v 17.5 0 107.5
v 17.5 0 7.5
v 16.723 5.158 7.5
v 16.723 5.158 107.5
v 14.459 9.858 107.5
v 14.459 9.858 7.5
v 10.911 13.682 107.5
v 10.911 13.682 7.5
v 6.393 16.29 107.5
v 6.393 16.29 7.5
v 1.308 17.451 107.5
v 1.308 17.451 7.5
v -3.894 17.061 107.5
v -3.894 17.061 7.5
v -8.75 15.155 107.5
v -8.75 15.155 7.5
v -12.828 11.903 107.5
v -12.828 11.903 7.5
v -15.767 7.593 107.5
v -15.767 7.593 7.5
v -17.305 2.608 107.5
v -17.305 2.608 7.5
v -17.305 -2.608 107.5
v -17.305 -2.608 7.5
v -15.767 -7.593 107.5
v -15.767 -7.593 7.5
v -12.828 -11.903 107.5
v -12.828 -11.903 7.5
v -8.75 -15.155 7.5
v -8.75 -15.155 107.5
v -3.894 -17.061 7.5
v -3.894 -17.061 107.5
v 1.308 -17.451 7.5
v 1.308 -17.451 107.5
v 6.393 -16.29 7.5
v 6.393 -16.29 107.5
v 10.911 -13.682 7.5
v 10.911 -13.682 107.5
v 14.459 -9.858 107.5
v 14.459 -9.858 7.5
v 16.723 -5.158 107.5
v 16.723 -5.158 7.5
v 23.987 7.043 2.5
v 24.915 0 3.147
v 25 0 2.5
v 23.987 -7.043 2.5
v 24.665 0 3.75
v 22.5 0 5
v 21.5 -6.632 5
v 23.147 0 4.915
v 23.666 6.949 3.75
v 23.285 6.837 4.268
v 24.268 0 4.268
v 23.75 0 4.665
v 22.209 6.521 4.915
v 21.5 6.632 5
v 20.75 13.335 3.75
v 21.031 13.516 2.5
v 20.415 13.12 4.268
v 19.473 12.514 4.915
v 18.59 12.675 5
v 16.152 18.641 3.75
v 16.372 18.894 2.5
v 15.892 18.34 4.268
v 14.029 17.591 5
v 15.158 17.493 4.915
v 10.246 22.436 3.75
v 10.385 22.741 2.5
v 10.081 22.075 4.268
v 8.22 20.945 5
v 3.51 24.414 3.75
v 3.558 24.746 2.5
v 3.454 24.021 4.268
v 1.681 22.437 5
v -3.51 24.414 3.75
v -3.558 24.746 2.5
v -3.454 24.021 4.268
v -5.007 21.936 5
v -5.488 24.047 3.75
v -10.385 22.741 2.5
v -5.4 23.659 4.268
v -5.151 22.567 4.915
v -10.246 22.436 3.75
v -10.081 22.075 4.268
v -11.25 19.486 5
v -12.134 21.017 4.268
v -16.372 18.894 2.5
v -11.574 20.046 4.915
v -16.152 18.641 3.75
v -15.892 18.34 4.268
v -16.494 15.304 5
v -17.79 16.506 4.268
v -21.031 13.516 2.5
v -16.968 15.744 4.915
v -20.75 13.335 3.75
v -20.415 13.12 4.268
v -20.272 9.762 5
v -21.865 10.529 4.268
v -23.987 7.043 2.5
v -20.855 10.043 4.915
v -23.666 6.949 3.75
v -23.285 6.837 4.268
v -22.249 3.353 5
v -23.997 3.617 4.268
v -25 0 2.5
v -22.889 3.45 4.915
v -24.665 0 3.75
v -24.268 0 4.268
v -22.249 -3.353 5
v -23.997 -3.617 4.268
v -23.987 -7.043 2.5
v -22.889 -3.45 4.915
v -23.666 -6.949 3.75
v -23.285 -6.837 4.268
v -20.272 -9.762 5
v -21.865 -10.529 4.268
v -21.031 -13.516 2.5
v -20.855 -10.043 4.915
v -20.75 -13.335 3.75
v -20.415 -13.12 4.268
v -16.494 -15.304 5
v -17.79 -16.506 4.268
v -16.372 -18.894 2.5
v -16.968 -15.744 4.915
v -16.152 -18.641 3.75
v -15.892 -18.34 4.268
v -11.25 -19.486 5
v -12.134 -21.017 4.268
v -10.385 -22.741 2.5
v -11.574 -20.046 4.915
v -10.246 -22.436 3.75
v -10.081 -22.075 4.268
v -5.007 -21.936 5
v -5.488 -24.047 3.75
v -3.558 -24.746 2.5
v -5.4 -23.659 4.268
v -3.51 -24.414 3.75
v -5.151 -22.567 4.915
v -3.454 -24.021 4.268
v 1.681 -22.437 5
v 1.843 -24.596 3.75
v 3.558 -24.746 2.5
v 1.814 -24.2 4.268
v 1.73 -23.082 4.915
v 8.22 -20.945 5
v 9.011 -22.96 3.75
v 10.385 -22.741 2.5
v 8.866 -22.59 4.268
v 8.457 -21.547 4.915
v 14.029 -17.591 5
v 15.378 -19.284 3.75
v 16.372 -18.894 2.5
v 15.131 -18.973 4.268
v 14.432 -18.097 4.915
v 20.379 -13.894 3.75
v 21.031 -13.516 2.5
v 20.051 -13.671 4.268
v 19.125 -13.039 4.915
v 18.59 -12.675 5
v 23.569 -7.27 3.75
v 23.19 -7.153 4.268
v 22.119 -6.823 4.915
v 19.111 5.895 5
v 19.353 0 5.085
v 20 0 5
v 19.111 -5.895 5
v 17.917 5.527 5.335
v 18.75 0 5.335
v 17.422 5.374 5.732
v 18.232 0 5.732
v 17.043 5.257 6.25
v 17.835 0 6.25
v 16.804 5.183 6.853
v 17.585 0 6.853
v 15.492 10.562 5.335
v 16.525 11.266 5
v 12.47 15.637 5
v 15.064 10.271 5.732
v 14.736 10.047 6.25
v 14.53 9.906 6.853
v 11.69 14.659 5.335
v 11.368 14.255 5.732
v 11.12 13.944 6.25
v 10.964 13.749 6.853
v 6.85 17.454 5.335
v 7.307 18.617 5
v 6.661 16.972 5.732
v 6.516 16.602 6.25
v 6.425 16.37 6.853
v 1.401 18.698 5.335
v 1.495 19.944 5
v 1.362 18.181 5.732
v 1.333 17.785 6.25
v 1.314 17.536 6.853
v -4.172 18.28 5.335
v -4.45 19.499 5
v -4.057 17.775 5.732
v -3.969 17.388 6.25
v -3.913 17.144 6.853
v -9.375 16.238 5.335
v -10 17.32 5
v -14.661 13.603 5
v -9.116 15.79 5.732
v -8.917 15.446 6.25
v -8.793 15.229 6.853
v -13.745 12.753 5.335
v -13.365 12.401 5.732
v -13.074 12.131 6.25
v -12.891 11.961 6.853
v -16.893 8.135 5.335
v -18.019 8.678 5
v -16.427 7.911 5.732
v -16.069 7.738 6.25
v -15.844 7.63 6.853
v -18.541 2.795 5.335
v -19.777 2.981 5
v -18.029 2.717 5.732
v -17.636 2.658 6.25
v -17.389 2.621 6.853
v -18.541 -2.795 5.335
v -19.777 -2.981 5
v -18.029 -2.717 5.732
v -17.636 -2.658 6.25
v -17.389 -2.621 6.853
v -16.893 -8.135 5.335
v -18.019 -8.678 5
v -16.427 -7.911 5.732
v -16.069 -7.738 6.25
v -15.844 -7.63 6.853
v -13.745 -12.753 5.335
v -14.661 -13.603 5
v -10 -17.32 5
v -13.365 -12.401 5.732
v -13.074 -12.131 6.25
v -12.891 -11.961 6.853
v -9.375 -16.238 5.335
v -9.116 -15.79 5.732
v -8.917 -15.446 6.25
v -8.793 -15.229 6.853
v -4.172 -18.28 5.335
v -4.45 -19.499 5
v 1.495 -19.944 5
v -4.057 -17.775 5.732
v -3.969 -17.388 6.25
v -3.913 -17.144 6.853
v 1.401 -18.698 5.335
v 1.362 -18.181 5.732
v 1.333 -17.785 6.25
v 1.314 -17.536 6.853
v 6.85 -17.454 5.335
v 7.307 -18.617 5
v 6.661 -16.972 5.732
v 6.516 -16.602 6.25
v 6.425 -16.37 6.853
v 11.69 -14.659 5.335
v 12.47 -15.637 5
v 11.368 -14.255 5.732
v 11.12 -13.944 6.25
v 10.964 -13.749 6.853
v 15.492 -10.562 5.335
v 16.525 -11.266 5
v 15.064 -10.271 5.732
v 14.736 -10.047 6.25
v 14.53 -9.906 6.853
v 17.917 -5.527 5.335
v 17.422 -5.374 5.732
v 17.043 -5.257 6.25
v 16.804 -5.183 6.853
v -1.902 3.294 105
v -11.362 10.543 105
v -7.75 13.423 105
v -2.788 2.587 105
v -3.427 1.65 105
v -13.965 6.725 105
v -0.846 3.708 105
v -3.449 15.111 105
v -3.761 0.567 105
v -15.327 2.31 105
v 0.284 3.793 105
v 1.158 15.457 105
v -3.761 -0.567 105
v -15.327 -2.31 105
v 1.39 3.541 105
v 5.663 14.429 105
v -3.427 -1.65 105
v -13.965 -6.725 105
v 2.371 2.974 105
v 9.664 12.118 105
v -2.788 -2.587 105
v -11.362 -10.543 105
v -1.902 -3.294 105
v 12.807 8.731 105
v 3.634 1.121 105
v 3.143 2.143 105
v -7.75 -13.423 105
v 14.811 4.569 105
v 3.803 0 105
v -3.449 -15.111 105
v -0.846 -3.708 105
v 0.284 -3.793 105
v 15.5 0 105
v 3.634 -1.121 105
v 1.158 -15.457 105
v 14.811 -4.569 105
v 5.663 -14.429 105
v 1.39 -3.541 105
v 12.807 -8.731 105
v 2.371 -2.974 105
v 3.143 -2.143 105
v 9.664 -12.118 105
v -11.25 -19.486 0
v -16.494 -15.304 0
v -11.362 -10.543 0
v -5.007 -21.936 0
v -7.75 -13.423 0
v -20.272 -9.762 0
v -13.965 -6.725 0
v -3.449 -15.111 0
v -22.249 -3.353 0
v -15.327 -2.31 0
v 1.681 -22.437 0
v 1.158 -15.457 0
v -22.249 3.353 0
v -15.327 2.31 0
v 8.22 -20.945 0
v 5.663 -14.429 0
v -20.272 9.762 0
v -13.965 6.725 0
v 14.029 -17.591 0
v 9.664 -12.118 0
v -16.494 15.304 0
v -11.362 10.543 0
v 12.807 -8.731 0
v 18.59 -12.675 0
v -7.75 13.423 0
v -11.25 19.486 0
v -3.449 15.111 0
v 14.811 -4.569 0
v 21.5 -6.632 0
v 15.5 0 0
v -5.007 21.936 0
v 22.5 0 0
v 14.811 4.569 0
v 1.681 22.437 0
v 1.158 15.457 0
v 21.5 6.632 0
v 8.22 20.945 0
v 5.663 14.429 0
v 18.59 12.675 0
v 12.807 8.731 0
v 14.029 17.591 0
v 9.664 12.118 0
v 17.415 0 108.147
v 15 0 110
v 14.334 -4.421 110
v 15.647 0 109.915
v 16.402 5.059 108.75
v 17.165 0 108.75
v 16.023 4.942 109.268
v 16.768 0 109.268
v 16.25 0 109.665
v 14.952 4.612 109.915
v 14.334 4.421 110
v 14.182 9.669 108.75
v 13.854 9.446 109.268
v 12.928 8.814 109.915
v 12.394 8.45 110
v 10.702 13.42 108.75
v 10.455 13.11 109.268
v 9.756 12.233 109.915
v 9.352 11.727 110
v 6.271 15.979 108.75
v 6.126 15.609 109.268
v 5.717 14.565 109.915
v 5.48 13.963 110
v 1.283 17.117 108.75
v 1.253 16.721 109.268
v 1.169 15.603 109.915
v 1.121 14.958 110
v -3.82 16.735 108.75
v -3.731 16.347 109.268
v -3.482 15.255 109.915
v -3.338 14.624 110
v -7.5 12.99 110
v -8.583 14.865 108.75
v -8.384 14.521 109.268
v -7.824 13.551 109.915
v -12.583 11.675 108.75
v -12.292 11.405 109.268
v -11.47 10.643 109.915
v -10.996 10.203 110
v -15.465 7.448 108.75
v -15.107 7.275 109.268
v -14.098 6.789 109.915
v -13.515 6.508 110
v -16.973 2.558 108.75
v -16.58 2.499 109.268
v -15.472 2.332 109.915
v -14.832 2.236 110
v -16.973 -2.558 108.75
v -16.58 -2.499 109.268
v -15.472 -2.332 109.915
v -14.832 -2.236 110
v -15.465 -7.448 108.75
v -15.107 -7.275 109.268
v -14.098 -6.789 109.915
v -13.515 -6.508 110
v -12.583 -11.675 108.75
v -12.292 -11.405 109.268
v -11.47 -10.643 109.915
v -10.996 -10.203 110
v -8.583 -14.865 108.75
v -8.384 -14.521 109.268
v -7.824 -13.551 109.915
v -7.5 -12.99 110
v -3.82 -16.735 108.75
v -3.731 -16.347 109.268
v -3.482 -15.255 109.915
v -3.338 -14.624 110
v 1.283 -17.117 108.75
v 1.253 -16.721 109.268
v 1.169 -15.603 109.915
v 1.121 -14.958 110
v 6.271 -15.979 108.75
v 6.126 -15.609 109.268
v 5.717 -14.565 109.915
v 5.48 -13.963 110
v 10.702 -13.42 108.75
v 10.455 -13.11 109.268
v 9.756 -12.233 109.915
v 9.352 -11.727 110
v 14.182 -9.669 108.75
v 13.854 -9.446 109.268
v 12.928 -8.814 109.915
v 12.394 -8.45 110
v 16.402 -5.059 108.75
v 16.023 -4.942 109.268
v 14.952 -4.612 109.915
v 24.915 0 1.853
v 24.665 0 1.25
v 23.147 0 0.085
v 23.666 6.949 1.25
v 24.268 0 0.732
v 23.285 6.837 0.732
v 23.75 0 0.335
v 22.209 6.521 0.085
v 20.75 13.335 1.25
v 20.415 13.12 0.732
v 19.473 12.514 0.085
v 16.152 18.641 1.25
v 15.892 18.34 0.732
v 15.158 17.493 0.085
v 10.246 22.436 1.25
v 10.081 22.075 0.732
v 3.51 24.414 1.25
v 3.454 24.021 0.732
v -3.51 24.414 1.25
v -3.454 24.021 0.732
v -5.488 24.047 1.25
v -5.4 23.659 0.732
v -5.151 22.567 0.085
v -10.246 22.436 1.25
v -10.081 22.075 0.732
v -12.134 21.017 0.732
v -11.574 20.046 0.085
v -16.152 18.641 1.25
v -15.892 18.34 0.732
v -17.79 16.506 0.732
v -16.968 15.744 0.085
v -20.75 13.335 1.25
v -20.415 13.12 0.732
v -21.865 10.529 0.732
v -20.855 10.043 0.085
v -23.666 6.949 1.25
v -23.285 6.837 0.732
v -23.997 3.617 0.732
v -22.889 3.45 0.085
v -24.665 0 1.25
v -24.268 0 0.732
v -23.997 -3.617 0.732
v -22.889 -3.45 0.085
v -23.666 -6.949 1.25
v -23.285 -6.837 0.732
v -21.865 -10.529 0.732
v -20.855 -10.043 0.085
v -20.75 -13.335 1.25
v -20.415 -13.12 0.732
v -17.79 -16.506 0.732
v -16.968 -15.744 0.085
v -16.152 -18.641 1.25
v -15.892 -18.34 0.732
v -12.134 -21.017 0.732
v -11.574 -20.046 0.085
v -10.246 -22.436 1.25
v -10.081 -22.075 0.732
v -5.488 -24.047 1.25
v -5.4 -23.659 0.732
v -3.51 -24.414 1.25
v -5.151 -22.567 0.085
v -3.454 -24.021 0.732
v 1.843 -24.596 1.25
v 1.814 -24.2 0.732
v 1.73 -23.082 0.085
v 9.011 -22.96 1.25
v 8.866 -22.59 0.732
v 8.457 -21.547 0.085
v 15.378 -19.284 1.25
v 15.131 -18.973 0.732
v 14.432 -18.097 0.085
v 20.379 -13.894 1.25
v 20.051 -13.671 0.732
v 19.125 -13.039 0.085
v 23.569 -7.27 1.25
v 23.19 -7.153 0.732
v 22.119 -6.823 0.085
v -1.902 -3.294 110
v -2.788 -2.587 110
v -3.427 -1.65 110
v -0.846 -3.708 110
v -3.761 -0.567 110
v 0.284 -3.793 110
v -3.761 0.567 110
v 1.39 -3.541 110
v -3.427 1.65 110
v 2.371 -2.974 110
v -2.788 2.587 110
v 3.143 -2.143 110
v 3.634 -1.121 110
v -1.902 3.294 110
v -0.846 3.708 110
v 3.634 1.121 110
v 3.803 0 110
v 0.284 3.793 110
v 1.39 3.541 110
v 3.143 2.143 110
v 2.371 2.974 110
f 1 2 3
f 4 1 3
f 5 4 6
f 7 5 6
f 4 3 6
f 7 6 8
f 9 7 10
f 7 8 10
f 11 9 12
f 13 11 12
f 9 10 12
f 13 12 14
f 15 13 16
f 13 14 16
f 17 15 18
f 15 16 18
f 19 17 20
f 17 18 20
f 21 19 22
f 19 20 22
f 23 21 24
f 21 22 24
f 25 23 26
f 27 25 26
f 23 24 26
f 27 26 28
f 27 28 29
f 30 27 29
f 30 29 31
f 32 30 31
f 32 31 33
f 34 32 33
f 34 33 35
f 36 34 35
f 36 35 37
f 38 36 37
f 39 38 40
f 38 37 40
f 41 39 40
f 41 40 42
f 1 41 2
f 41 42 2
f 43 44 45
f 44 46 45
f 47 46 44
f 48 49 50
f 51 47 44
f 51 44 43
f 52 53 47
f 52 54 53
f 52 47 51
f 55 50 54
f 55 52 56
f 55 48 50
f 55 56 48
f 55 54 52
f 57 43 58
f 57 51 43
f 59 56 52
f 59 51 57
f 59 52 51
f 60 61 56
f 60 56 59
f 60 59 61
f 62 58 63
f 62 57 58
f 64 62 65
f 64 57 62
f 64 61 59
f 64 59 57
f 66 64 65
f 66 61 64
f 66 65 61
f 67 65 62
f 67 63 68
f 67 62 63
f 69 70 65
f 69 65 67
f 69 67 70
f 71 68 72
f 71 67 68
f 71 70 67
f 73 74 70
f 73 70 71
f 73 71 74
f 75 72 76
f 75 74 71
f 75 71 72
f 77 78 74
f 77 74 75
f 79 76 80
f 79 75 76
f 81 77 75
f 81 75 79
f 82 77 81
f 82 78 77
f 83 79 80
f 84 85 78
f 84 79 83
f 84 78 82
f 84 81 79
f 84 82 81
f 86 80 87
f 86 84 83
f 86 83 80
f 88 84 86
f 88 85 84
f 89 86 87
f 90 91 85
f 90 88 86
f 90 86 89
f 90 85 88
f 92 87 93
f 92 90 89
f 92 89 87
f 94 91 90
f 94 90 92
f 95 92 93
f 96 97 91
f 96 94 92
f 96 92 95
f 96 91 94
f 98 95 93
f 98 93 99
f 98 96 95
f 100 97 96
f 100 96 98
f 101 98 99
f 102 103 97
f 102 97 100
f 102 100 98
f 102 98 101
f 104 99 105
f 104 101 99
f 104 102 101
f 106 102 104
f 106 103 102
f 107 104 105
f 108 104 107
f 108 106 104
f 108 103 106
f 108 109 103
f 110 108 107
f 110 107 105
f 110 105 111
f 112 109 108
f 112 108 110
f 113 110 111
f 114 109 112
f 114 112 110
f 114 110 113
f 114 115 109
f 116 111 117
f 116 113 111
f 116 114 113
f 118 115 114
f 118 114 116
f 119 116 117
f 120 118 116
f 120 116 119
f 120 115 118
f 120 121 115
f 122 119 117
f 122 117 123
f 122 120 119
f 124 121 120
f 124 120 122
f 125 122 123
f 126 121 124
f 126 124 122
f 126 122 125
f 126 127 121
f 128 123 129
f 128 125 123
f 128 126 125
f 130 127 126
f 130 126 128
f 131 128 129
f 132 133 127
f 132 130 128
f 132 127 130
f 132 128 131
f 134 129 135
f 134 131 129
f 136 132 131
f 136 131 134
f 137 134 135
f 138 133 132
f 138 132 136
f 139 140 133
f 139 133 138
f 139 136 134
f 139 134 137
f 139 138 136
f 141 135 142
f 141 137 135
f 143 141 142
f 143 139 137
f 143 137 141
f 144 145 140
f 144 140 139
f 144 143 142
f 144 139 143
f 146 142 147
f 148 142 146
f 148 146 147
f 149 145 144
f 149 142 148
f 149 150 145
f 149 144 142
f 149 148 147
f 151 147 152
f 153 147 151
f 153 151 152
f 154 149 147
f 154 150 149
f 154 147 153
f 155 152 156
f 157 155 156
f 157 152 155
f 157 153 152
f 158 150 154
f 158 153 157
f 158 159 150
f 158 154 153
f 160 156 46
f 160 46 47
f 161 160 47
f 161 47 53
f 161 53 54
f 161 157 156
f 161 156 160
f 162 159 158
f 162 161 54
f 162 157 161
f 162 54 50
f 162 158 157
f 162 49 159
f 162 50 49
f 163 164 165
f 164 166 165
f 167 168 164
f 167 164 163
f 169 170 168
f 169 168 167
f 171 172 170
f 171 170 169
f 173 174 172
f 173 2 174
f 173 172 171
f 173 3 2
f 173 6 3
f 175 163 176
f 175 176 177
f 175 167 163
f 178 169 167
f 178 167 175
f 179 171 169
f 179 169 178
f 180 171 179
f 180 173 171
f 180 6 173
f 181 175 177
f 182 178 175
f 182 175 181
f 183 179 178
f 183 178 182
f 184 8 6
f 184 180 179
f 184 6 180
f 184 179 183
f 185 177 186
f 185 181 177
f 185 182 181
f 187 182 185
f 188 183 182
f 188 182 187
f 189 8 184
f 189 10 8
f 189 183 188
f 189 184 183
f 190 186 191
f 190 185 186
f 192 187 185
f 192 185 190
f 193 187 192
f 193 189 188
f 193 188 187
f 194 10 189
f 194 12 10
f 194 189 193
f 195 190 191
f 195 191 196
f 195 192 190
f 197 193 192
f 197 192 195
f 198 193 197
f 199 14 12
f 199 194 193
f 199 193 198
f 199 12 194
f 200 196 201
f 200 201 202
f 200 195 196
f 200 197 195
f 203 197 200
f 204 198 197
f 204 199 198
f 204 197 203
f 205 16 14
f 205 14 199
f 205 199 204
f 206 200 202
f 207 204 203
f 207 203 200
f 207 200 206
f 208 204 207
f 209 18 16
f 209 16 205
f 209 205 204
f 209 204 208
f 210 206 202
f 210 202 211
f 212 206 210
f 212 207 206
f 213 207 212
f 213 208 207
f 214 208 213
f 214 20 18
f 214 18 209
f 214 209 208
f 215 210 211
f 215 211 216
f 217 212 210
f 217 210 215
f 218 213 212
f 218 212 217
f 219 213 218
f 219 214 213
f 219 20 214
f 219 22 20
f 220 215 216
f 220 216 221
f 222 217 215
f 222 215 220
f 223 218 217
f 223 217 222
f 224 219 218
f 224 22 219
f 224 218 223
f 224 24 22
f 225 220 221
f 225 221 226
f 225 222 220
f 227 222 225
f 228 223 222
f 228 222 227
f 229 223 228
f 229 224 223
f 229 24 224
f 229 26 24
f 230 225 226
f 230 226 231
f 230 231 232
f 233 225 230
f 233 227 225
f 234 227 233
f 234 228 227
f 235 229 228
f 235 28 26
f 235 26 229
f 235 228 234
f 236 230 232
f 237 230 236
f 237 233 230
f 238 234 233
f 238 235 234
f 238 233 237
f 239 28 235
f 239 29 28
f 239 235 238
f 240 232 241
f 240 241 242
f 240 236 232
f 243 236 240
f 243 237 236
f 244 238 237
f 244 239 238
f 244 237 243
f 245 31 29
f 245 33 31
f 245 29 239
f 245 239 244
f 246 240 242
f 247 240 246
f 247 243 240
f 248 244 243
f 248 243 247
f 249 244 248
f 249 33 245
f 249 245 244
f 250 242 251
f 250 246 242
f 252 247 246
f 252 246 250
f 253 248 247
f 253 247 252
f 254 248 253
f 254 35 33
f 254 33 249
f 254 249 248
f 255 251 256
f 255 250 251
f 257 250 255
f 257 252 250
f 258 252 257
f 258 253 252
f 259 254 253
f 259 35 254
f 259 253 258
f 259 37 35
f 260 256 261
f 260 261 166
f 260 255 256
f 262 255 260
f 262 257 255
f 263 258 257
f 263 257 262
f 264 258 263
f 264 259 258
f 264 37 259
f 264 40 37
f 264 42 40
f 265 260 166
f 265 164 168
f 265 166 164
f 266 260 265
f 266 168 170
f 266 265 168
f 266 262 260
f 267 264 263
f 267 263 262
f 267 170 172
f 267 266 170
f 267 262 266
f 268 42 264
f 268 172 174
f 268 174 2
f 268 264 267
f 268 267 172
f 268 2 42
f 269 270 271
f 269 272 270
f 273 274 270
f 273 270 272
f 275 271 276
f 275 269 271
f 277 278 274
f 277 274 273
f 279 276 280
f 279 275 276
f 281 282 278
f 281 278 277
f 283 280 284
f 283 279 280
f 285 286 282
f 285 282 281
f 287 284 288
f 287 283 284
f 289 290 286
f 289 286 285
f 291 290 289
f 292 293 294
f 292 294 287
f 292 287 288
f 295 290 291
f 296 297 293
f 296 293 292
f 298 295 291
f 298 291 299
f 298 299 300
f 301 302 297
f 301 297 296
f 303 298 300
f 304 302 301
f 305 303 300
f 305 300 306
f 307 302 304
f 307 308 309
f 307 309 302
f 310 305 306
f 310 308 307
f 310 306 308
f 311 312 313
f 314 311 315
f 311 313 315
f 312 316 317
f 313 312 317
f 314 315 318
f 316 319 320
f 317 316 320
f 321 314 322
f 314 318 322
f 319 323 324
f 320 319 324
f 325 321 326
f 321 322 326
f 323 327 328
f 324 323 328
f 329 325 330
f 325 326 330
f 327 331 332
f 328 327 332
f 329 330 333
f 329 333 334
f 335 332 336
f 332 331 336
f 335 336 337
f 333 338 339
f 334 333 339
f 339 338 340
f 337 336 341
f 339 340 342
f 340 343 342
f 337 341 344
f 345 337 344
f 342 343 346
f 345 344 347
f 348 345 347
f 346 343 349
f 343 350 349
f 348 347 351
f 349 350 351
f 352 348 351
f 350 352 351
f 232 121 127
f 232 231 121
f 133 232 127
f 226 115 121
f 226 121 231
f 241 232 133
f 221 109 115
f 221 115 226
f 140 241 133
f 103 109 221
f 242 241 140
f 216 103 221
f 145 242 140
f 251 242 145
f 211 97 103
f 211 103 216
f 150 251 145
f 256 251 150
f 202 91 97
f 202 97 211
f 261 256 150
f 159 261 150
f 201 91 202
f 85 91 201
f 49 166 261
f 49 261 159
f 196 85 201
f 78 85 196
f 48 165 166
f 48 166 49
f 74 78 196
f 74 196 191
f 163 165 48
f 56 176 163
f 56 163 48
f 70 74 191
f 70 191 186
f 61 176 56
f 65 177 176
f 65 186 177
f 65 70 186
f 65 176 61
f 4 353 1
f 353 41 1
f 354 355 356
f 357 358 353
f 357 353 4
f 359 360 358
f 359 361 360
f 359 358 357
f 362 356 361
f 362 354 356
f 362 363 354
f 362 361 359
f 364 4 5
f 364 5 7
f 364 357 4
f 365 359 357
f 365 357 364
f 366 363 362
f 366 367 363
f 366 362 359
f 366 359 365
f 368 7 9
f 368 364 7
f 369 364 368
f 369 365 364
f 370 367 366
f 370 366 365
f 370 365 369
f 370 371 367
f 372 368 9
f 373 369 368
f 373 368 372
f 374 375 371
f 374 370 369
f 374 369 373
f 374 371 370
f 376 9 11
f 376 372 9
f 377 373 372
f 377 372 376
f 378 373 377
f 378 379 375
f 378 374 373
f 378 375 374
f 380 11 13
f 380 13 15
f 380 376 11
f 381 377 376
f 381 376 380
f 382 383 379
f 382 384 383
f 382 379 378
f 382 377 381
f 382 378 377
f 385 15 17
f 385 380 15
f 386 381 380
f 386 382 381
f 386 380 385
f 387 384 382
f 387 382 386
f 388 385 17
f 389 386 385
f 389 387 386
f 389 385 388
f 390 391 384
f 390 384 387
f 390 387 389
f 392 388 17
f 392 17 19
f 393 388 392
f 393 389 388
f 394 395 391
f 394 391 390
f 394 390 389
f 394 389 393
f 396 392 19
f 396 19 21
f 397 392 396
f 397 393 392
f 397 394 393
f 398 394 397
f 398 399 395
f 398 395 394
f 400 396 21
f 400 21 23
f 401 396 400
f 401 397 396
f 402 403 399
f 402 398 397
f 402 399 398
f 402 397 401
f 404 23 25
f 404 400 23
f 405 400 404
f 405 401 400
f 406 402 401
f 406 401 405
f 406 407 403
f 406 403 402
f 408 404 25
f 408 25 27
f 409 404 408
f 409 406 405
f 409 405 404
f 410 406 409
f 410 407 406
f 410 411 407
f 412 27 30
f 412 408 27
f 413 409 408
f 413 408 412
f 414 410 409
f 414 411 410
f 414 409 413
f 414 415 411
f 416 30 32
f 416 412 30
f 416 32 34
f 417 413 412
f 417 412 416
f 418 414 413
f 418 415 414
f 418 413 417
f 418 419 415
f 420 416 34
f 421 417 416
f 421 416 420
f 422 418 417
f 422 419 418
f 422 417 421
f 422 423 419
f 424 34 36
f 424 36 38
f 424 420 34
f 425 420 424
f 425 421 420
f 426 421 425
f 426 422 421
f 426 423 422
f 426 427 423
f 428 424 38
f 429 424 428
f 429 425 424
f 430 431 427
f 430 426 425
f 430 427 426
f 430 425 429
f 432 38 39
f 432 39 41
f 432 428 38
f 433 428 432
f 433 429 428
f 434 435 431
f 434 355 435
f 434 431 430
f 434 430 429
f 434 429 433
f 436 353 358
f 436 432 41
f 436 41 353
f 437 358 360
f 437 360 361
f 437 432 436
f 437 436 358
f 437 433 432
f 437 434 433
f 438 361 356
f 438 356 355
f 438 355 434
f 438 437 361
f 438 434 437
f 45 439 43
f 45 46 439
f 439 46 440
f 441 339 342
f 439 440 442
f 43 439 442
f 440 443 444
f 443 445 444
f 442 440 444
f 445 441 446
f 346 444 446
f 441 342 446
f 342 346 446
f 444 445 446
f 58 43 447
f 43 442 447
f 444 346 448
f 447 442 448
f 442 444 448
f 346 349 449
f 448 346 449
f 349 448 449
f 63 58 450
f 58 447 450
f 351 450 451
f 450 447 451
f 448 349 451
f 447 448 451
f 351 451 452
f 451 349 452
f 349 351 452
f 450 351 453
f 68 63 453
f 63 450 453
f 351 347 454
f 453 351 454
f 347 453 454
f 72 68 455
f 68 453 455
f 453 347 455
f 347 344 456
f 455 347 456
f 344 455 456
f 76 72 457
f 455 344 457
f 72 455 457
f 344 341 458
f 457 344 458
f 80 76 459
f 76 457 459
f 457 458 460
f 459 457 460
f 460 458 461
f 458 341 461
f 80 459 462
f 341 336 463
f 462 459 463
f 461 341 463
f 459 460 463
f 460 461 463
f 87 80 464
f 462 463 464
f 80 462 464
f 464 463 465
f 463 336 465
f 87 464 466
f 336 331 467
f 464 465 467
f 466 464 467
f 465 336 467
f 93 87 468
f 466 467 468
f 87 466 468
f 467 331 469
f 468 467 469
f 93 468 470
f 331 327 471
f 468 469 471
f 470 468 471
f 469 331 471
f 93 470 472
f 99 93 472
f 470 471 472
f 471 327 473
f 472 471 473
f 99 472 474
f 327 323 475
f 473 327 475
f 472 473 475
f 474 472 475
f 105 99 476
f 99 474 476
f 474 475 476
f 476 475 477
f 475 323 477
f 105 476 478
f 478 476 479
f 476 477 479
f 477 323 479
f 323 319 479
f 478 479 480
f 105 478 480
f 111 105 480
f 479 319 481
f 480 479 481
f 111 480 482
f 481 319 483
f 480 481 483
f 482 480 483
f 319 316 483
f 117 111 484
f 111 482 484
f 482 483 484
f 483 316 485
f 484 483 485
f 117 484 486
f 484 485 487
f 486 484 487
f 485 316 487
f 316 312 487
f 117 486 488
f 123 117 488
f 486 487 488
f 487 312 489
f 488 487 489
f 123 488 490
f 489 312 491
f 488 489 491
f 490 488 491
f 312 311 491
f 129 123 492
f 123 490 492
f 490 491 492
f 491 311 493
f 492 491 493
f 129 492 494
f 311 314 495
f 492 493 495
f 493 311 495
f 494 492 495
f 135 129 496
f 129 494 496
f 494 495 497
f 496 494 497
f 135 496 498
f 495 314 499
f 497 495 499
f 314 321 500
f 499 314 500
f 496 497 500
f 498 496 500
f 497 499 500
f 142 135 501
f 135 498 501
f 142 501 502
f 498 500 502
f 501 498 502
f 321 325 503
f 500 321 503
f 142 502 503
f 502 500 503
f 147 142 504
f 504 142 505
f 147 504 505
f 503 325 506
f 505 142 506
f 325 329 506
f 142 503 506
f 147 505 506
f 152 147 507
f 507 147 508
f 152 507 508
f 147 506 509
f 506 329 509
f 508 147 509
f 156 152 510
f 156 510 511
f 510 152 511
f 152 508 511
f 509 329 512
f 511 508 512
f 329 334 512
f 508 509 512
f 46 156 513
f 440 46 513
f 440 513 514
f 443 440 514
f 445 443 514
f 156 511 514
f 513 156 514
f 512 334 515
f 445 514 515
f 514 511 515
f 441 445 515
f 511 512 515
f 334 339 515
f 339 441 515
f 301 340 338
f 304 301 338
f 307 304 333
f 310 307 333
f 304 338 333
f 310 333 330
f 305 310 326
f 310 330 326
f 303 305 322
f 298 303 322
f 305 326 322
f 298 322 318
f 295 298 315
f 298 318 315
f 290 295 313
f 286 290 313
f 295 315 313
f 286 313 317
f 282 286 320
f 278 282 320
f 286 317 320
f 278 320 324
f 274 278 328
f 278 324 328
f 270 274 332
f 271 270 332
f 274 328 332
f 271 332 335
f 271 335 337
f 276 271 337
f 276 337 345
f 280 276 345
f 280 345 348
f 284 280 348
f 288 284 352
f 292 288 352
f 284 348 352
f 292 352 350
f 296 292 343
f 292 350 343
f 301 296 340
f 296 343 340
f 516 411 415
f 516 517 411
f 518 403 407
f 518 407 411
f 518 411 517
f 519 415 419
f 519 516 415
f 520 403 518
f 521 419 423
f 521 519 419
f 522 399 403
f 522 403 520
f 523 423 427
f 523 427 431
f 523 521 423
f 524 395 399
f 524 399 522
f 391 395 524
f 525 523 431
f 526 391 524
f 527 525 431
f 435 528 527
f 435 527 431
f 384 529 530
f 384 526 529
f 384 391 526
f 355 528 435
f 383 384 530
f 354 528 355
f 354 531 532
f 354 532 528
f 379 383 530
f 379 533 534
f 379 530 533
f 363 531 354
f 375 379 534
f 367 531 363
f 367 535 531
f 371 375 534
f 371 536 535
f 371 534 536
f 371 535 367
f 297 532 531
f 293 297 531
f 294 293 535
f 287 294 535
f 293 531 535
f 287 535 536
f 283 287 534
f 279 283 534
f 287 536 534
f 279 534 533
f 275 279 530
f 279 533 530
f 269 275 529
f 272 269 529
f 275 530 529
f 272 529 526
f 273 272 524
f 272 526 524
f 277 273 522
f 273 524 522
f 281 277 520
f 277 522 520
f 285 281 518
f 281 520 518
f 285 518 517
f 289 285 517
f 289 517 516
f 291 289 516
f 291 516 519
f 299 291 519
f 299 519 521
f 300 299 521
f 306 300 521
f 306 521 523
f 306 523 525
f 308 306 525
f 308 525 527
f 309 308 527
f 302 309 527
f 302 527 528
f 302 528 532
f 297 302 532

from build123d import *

# Parameters (mm, degrees)
F0_R     = 25
F1_DEPTH = 5
F2_R     = 17.5
F3_DEPTH = 105
F4_R     = 15.5
F5_DEPTH = 105
F6_R     = 2.49999
F7_R     = 3.8034251557
F8_DEPTH = 30


# Not quite as in the source:
# - a fillet or chamfer is up to 0.001 mm smaller than in the source, because OpenCascade refuses the exact size


with BuildPart() as f1:
    # F0 (on Top) → F1 (new body)
    with BuildSketch(Plane.XY):
        Circle(F0_R)
    extrude(amount=F1_DEPTH)

    # F2 (on face) → F3 (join)
    with BuildSketch(Plane.XY.offset(5)):
        Circle(F2_R)
    extrude(amount=F3_DEPTH)

    # F4 (on face) → F5 (cut)
    with BuildSketch(Plane(origin=(0, 0, 0), x_dir=(1, 0, 0), z_dir=(0, 0, -1))):
        Circle(F4_R)
    extrude(amount=-F5_DEPTH, mode=Mode.SUBTRACT)

    # F6 (radius 2.5 in the source; OpenCascade refuses exactly that, so slightly less here)
    f6_edges = [f1.edges().sort_by_distance(p)[0] for p in [
        (-17.5, 0, 110),
        (-17.5, 0, 5),
        (-25, 0, 5),
        (-25, 0, 0),
    ]]
    fillet(f6_edges, radius=F6_R)

    # F7 (on face) → F8 (cut)
    with BuildSketch(Plane.XY.offset(110)):
        Circle(F7_R)
    extrude(amount=-F8_DEPTH, mode=Mode.SUBTRACT)


solid = f1.part
